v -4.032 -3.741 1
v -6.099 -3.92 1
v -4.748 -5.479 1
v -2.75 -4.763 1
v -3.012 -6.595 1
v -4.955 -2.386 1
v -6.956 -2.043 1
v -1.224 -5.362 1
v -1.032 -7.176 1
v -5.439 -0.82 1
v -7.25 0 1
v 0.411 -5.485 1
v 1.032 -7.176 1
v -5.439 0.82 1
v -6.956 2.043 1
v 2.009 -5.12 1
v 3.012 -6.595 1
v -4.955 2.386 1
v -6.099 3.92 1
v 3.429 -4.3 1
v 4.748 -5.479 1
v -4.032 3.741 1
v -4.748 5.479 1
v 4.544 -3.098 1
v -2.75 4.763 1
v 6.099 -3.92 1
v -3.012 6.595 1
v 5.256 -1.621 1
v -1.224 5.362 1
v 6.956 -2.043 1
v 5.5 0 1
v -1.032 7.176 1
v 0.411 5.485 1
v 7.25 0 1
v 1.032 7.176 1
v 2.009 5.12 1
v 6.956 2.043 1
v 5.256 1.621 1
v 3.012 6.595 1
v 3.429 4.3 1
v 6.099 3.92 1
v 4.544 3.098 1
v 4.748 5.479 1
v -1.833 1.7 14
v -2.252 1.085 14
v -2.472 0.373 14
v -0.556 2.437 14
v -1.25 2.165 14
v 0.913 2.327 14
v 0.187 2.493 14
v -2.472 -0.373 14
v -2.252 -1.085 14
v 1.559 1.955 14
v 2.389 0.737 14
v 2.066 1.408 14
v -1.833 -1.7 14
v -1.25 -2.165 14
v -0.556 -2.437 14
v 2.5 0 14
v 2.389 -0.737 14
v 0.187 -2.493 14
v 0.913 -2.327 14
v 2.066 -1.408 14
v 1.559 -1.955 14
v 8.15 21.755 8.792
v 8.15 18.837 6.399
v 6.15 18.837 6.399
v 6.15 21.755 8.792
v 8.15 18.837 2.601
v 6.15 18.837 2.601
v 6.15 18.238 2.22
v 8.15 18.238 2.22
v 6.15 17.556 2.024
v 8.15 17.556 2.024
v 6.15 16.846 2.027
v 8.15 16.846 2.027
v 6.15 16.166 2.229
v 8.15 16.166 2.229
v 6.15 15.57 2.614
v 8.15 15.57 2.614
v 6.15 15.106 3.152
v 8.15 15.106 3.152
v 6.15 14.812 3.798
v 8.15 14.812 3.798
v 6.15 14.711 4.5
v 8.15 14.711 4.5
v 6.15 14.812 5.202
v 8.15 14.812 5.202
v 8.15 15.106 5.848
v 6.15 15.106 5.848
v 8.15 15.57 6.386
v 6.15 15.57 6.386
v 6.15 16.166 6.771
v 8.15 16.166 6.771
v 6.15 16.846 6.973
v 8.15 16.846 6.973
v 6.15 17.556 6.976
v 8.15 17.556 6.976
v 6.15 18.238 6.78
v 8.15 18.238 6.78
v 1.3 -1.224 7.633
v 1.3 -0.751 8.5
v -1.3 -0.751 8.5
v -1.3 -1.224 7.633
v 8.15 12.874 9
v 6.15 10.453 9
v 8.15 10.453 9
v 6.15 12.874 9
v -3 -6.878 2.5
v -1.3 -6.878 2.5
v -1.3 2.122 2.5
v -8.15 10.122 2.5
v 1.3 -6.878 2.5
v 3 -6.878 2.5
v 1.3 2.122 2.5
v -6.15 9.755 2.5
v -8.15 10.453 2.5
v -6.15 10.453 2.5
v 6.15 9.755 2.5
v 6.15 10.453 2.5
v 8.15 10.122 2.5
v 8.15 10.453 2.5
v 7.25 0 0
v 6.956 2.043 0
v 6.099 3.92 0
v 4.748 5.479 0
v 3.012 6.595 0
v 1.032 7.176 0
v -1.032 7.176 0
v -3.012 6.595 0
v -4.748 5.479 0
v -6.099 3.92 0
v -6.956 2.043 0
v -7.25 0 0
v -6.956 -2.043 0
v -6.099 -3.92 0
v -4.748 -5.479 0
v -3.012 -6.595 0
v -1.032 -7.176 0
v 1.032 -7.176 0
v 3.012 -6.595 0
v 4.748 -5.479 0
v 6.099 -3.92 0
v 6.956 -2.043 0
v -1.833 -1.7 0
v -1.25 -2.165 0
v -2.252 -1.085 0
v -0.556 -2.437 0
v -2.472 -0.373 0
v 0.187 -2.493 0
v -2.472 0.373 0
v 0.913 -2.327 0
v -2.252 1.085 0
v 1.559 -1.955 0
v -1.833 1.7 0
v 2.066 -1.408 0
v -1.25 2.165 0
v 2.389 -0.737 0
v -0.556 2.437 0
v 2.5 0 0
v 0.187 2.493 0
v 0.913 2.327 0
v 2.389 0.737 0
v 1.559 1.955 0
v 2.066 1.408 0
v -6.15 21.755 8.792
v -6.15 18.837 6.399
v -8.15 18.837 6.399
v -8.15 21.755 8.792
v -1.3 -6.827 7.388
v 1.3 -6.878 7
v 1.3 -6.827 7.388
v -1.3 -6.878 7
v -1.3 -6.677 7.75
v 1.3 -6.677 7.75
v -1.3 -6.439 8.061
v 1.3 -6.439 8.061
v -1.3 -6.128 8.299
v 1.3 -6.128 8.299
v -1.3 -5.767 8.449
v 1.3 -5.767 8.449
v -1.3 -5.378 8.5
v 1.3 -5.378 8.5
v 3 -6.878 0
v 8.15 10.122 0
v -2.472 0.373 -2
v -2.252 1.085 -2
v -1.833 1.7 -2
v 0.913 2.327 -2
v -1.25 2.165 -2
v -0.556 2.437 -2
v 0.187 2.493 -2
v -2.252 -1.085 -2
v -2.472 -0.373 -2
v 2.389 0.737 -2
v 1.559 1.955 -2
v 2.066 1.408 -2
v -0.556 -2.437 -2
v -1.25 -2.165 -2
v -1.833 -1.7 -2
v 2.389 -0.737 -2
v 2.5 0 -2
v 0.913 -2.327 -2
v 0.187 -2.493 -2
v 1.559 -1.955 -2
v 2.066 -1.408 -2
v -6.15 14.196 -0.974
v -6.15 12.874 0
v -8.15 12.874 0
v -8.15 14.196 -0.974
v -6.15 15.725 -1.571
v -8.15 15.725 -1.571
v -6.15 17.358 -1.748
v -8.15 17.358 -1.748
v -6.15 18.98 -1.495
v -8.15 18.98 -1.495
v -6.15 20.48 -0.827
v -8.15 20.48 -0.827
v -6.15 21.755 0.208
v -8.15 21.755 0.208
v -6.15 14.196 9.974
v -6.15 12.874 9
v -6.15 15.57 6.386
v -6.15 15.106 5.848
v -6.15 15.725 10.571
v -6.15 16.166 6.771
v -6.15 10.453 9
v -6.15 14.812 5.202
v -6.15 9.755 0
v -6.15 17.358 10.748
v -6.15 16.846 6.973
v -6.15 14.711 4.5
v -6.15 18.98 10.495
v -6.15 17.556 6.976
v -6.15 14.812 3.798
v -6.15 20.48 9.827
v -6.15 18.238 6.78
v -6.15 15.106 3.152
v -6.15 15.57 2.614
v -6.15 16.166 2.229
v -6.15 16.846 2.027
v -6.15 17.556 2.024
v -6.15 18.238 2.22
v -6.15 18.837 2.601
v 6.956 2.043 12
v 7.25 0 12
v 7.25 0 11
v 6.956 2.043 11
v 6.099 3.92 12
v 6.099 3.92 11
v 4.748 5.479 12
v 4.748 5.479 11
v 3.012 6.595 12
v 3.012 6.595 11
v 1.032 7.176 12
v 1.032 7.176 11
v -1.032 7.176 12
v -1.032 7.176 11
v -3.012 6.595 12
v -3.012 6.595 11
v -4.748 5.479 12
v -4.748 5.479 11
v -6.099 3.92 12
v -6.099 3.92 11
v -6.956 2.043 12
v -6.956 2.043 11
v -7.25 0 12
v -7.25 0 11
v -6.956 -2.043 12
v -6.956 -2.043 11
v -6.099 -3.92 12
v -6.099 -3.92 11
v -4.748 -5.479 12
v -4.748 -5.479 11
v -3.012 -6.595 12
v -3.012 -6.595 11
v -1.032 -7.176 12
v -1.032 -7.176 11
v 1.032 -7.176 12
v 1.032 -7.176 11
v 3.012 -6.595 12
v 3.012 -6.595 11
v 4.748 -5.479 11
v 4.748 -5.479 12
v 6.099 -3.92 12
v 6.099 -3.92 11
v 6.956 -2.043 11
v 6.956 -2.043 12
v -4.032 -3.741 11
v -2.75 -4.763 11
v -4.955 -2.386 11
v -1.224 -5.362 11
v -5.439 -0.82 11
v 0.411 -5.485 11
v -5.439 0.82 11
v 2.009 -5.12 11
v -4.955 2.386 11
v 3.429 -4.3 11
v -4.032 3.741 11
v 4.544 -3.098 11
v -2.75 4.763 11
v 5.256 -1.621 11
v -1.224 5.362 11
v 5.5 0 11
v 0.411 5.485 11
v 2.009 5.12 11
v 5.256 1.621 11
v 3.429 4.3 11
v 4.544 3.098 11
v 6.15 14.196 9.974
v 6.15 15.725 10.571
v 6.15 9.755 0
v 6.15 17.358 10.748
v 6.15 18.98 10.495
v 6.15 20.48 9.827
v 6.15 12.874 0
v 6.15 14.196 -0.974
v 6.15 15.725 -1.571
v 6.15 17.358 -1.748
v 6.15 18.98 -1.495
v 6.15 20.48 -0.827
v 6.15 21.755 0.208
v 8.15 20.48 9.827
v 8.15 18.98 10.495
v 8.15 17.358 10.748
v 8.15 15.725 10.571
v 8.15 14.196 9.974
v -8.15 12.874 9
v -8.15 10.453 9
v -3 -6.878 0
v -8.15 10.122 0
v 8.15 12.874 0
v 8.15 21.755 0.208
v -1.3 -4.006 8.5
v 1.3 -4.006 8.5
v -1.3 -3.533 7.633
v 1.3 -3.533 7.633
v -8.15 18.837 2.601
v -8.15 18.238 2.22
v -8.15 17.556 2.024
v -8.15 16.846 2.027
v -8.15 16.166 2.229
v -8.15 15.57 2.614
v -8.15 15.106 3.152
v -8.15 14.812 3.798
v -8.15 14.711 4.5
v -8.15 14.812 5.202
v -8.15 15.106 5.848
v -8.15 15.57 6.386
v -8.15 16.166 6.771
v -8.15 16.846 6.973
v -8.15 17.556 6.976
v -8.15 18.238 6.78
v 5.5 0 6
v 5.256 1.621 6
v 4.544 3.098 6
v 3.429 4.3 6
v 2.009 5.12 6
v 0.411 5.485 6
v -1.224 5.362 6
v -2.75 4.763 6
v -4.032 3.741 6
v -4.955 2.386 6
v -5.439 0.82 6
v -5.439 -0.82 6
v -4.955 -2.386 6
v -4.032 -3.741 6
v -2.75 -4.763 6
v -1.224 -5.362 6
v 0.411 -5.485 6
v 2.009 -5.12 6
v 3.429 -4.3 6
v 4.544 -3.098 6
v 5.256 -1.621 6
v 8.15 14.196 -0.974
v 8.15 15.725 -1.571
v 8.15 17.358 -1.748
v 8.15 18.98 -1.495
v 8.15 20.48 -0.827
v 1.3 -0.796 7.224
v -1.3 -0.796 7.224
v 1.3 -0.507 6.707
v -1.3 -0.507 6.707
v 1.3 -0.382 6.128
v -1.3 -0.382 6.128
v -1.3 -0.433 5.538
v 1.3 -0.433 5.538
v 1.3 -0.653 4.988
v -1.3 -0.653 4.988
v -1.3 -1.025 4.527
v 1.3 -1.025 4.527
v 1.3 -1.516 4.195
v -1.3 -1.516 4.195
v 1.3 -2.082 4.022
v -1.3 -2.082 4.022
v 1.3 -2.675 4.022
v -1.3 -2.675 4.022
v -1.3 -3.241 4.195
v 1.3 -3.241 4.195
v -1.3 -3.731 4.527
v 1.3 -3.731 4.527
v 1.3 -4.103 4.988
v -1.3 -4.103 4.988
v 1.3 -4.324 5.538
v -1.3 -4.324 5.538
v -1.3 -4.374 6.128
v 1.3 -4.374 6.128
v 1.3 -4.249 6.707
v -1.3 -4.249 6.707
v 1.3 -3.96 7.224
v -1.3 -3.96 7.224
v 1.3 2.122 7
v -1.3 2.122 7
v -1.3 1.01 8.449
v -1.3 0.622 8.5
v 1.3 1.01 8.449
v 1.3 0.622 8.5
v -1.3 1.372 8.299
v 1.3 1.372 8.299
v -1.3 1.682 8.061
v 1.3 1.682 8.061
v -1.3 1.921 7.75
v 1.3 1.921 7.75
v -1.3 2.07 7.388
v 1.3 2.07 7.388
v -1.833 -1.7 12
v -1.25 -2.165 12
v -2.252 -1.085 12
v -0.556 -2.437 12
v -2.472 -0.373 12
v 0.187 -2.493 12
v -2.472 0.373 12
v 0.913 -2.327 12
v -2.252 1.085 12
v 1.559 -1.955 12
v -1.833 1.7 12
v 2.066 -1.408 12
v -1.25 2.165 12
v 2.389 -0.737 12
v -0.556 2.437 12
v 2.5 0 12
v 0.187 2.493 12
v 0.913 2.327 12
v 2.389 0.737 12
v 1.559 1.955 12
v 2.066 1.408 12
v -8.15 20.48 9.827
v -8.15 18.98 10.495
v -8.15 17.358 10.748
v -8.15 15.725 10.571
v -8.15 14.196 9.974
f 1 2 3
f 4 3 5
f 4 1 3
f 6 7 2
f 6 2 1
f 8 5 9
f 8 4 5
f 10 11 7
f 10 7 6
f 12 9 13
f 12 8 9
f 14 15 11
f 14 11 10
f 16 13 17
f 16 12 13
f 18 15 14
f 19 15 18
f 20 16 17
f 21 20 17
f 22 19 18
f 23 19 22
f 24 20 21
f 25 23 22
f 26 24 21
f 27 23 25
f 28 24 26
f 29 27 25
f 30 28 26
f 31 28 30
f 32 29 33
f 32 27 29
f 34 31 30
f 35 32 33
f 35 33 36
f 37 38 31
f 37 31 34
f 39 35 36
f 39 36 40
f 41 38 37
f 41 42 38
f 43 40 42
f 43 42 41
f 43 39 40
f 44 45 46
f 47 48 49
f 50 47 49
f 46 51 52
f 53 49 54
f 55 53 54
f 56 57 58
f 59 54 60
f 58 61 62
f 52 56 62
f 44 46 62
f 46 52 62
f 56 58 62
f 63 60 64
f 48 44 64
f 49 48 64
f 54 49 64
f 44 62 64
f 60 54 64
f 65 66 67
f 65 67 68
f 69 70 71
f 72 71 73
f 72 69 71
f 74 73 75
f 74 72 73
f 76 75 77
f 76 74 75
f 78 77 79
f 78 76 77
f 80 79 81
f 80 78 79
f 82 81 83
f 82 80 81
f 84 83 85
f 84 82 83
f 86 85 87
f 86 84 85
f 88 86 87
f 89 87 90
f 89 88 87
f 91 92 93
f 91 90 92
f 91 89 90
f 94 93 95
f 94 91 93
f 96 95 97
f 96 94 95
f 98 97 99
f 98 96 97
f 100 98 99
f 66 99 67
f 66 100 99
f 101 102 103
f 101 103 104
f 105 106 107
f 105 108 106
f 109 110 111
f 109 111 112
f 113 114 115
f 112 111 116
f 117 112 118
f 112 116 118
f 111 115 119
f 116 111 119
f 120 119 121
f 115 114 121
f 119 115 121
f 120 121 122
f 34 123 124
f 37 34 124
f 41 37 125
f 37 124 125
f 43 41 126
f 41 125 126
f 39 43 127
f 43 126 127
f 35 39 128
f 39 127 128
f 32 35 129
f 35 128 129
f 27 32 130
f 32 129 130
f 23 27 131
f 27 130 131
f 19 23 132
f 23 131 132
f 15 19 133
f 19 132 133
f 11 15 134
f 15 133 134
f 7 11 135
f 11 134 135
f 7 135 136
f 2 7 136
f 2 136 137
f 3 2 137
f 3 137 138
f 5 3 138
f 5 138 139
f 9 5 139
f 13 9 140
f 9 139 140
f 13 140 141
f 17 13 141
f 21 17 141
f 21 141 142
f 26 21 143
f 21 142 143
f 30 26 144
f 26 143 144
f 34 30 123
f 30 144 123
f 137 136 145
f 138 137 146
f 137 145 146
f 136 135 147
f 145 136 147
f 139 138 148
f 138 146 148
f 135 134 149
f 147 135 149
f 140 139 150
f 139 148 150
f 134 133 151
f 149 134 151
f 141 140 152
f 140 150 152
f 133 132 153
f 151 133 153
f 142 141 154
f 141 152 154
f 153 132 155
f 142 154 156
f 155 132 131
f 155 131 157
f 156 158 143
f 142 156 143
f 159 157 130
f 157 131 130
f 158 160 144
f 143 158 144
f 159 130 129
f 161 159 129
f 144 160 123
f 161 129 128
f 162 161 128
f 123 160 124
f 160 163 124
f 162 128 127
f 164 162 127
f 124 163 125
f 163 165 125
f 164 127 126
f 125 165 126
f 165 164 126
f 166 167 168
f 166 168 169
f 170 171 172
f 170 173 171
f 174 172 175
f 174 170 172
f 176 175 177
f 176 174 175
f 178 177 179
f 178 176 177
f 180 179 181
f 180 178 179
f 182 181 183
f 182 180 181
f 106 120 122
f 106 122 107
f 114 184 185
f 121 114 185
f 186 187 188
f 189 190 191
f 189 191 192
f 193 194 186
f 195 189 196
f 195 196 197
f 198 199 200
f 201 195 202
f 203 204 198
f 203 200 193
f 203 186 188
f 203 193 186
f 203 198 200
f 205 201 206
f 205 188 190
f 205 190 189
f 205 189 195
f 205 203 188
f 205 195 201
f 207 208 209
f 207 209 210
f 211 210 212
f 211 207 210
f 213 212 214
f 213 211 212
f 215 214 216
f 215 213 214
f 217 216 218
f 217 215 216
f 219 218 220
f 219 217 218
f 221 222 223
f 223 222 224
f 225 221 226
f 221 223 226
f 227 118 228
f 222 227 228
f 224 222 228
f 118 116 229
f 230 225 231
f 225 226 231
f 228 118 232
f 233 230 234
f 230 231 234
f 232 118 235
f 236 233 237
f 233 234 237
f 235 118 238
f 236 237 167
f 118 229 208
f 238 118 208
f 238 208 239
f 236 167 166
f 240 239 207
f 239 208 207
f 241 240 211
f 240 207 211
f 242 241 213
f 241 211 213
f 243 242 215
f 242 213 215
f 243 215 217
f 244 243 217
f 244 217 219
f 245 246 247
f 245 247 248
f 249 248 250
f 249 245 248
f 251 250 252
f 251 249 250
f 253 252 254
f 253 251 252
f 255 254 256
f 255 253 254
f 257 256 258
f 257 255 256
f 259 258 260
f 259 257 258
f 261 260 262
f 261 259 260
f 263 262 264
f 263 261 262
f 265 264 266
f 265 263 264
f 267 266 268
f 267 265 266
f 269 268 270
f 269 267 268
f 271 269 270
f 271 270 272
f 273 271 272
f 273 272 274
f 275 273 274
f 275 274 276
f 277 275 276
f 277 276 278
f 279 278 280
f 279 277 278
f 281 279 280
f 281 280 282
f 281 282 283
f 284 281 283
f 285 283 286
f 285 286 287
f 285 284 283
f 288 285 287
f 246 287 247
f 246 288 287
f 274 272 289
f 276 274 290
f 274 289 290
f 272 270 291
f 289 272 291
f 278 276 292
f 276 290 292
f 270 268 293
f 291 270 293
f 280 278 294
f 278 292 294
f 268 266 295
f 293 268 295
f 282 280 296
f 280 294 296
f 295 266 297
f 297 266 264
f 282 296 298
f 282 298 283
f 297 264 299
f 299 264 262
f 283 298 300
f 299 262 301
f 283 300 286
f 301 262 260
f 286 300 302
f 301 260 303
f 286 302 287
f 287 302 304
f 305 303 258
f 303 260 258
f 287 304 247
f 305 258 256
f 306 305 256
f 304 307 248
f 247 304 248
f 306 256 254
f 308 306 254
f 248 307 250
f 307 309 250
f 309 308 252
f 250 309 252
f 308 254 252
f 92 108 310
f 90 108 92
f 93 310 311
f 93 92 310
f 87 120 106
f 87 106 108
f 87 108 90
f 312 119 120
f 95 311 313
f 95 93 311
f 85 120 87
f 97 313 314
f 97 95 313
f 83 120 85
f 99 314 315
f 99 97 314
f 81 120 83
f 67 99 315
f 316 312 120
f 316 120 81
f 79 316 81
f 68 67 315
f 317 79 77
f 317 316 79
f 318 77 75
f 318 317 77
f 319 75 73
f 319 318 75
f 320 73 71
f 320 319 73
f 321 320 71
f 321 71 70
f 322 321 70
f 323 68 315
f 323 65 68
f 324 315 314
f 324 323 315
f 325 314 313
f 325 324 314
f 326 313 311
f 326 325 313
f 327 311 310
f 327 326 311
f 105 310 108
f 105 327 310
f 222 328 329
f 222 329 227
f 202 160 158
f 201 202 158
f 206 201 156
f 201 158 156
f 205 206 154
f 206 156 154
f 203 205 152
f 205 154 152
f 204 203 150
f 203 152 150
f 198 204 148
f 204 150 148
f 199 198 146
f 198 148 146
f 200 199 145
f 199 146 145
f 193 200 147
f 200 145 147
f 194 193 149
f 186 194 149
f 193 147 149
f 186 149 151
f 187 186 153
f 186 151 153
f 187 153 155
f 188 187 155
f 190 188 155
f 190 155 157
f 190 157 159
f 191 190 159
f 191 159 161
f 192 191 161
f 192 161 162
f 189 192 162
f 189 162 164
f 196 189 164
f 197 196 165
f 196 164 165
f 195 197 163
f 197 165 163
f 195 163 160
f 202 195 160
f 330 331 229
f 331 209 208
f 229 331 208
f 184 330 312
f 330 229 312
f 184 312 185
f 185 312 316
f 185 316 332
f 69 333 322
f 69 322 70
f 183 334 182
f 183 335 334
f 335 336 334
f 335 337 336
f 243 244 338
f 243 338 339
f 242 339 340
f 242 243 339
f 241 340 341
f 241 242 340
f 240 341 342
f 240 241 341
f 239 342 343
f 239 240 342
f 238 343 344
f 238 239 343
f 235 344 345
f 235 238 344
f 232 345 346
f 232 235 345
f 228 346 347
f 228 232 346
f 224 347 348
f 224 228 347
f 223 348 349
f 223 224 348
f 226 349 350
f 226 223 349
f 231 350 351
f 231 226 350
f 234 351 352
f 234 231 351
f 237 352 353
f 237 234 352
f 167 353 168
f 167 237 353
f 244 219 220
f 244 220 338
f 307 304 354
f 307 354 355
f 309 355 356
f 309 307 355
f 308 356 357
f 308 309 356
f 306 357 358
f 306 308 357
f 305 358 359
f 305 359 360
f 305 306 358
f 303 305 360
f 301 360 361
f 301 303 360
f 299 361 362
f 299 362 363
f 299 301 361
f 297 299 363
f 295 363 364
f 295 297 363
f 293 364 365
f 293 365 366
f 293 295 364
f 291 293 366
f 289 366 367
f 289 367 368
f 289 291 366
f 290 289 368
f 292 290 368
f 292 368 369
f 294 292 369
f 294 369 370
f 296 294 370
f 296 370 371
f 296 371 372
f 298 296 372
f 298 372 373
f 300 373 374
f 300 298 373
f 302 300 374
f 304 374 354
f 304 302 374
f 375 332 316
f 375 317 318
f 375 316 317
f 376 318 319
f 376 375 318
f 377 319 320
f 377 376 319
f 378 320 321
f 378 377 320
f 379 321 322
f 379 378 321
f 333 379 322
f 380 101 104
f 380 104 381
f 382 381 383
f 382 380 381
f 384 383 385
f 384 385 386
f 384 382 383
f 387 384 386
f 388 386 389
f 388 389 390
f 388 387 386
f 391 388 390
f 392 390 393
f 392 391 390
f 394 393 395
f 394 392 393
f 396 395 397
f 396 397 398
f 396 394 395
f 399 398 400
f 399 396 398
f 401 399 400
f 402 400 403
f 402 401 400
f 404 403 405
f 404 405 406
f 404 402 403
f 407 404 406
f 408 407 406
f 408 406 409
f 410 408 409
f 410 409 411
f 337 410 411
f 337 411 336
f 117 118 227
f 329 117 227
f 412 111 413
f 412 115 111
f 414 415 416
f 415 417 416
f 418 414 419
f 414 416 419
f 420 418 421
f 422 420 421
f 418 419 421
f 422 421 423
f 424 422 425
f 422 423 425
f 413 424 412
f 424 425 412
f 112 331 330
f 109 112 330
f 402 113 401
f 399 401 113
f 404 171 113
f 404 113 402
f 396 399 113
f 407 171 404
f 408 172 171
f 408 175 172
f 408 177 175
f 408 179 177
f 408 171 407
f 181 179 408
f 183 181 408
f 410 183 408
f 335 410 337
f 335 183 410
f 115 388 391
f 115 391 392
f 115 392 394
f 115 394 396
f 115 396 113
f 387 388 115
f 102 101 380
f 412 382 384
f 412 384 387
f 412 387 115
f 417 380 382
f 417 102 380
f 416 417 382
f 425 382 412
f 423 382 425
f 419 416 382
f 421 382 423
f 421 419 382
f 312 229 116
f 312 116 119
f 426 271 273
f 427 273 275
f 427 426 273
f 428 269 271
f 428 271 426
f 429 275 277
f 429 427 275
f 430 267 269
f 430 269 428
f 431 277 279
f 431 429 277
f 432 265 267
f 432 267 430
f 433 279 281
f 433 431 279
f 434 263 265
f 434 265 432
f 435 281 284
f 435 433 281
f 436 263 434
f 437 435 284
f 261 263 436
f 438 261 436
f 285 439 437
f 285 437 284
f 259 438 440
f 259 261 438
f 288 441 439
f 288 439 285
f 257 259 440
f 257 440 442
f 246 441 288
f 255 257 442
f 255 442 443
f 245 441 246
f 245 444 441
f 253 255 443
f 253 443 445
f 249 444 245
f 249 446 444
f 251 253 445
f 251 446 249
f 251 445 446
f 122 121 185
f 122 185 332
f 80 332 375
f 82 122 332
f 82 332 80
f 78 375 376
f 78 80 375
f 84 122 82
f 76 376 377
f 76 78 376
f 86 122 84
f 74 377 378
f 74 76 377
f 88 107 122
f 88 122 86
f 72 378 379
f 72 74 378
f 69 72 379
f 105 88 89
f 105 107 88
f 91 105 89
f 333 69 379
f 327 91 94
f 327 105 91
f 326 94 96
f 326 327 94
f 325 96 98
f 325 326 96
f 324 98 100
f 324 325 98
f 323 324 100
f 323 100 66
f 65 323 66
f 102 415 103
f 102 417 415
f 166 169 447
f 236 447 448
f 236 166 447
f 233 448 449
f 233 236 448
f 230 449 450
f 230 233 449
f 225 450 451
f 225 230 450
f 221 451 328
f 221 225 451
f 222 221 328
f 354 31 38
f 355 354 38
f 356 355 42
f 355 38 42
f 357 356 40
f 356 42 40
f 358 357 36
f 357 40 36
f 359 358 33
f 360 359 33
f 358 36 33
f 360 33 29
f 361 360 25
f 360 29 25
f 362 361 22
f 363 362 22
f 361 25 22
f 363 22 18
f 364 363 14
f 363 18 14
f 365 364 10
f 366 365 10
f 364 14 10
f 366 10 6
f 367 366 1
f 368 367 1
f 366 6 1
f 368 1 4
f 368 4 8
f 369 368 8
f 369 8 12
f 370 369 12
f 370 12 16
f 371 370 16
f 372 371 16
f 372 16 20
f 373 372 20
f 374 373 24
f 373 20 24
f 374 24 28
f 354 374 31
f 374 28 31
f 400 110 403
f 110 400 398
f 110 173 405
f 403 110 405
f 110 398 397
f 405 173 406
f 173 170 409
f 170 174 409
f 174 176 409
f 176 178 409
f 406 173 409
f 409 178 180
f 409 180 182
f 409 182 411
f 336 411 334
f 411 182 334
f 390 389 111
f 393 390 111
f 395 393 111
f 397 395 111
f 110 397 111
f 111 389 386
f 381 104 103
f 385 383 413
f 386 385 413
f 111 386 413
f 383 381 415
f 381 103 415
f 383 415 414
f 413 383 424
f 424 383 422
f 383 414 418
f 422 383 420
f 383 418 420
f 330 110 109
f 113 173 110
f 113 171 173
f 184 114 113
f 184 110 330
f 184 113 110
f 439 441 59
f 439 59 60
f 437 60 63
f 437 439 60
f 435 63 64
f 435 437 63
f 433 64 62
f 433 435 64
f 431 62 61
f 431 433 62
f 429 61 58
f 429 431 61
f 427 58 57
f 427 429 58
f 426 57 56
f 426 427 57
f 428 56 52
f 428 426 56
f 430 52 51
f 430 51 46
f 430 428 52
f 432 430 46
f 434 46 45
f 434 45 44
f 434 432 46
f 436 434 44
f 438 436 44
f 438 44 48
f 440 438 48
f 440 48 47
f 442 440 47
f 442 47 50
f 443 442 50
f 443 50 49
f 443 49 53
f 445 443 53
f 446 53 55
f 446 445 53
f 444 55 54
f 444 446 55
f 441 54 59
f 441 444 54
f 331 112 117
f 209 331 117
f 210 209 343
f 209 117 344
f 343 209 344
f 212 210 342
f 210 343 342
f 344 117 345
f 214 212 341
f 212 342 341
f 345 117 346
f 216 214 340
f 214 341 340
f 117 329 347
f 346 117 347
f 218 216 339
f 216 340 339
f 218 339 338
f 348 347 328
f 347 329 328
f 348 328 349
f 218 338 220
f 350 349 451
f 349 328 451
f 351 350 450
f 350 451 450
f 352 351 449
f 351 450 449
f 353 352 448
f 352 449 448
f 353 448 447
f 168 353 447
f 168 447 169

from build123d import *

# Parameters (mm, degrees)
F0_R           = 7.25
F1_DEPTH       = 1
F2_R           = 5.5
F3_DEPTH       = 5
F4_R           = 2.5
F5_DEPTH       = 2
F8_DEPTH       = 9
F10_DEPTH      = 8.15
F10_DEPTH_BACK = 8.15
F11_W          = 12.3
F11_H          = 13.3198345661
F12_DEPTH      = 25
F12_DEPTH_BACK = 25
F13_W          = 18.4948361841
F13_H          = 7.169587491
F14_DEPTH      = 25
F14_DEPTH_BACK = 25
F16_DEPTH      = 1.3
F16_DEPTH_BACK = 1.3
F17_R          = 1.5


with BuildPart() as f1:
    # F0 (on Top) → F1 (new body)
    with BuildSketch(Plane.XY):
        Circle(F0_R)
    extrude(amount=F1_DEPTH)

    # F2 (on face) → F3 (join)
    with BuildSketch(Plane.XY.offset(1)):
        Circle(F2_R)
    extrude(amount=F3_DEPTH)

    # F4 (on face) → F5 (join)
    with BuildSketch(Plane(origin=(0, 0, 0), x_dir=(1, 0, 0), z_dir=(0, 0, -1))):
        Circle(F4_R)
    extrude(amount=F5_DEPTH)

    # F6: F1 across face


with BuildPart() as f1_1:
    add(f1.part)
    add(f1.part.mirror(Plane.XY.offset(6)))


with BuildPart() as f8:
    # F7 (on Top) → F8 (new body)
    with BuildSketch(Plane.XY):
        Polygon((8.15, 13.1216109544), (0, 13.1216109544), (-8.15, 13.1216109544), (-8.15, 10.1216109544), (-3, -6.8783890456), (0, -6.8783890456), (3, -6.8783890456), (8.15, 10.1216109544), align=None)
    extrude(amount=F8_DEPTH)

    # F9 (on Right) → F10 (join, two sides)
    with BuildSketch(Plane.YZ) as f10_sk:
        with BuildLine():
            Line((18.8368415974, 6.399459286), (21.7546150774, 8.792052357))
            ThreePointArc((21.7546150774, 8.792052357), (10.9614018351, 4.5), (21.7546150774, 0.207947643))
            Line((21.7546150774, 0.207947643), (18.8368415974, 2.600540714))
            ThreePointArc((18.8368415974, 2.600540714), (14.7114018351, 4.5), (18.8368415974, 6.399459286))
        make_face()
    extrude(amount=F10_DEPTH)
    extrude(f10_sk.sketch, amount=-F10_DEPTH_BACK)

    # F11 (on Top) → F12 (cut, two sides)
    with BuildSketch(Plane.XY) as f12_sk:
        with Locations((0, 16.4145323604)):
            Rectangle(F11_W, F11_H)
    extrude(amount=F12_DEPTH, mode=Mode.SUBTRACT)
    extrude(f12_sk.sketch, amount=-F12_DEPTH_BACK, mode=Mode.SUBTRACT)

    # F13 (on Right) → F14 (cut, two sides)
    with BuildSketch(Plane.YZ) as f14_sk:
        with Locations((1.2051223312, 6.0847937455)):
            Rectangle(F13_W, F13_H)
    extrude(amount=-F14_DEPTH, mode=Mode.SUBTRACT)
    extrude(f14_sk.sketch, amount=F14_DEPTH_BACK, mode=Mode.SUBTRACT)

    # F15 (on Right) → F16 (join, two sides)
    with BuildSketch(Plane.YZ) as f16_sk:
        with BuildLine():
            Line((-6.8783890456, 8.5), (-6.8783890456, 2.5))
            Line((-6.8783890456, 2.5), (2.1216109544, 2.5))
            Line((2.1216109544, 2.5), (2.1216109544, 8.5))
            Line((2.1216109544, 8.5), (-0.7507189293, 8.5))
            Line((-0.7507189293, 8.5), (-1.2240023592, 7.6332150435))
            ThreePointArc((-1.2240023592, 7.6332150435), (-2.3783890456, 4), (-3.532775732, 7.6332150435))
            Line((-3.532775732, 7.6332150435), (-4.0060591619, 8.5))
            Line((-4.0060591619, 8.5), (-6.8783890456, 8.5))
        make_face()
    extrude(amount=F16_DEPTH)
    extrude(f16_sk.sketch, amount=-F16_DEPTH_BACK)

    # F17
    f17_edges = [f8.edges().sort_by_distance(p)[0] for p in [
        (0, -6.878389, 8.5),
        (0, 2.121611, 8.5),
    ]]
    fillet(f17_edges, radius=F17_R)


solid = Compound([f1_1.part, f8.part])
